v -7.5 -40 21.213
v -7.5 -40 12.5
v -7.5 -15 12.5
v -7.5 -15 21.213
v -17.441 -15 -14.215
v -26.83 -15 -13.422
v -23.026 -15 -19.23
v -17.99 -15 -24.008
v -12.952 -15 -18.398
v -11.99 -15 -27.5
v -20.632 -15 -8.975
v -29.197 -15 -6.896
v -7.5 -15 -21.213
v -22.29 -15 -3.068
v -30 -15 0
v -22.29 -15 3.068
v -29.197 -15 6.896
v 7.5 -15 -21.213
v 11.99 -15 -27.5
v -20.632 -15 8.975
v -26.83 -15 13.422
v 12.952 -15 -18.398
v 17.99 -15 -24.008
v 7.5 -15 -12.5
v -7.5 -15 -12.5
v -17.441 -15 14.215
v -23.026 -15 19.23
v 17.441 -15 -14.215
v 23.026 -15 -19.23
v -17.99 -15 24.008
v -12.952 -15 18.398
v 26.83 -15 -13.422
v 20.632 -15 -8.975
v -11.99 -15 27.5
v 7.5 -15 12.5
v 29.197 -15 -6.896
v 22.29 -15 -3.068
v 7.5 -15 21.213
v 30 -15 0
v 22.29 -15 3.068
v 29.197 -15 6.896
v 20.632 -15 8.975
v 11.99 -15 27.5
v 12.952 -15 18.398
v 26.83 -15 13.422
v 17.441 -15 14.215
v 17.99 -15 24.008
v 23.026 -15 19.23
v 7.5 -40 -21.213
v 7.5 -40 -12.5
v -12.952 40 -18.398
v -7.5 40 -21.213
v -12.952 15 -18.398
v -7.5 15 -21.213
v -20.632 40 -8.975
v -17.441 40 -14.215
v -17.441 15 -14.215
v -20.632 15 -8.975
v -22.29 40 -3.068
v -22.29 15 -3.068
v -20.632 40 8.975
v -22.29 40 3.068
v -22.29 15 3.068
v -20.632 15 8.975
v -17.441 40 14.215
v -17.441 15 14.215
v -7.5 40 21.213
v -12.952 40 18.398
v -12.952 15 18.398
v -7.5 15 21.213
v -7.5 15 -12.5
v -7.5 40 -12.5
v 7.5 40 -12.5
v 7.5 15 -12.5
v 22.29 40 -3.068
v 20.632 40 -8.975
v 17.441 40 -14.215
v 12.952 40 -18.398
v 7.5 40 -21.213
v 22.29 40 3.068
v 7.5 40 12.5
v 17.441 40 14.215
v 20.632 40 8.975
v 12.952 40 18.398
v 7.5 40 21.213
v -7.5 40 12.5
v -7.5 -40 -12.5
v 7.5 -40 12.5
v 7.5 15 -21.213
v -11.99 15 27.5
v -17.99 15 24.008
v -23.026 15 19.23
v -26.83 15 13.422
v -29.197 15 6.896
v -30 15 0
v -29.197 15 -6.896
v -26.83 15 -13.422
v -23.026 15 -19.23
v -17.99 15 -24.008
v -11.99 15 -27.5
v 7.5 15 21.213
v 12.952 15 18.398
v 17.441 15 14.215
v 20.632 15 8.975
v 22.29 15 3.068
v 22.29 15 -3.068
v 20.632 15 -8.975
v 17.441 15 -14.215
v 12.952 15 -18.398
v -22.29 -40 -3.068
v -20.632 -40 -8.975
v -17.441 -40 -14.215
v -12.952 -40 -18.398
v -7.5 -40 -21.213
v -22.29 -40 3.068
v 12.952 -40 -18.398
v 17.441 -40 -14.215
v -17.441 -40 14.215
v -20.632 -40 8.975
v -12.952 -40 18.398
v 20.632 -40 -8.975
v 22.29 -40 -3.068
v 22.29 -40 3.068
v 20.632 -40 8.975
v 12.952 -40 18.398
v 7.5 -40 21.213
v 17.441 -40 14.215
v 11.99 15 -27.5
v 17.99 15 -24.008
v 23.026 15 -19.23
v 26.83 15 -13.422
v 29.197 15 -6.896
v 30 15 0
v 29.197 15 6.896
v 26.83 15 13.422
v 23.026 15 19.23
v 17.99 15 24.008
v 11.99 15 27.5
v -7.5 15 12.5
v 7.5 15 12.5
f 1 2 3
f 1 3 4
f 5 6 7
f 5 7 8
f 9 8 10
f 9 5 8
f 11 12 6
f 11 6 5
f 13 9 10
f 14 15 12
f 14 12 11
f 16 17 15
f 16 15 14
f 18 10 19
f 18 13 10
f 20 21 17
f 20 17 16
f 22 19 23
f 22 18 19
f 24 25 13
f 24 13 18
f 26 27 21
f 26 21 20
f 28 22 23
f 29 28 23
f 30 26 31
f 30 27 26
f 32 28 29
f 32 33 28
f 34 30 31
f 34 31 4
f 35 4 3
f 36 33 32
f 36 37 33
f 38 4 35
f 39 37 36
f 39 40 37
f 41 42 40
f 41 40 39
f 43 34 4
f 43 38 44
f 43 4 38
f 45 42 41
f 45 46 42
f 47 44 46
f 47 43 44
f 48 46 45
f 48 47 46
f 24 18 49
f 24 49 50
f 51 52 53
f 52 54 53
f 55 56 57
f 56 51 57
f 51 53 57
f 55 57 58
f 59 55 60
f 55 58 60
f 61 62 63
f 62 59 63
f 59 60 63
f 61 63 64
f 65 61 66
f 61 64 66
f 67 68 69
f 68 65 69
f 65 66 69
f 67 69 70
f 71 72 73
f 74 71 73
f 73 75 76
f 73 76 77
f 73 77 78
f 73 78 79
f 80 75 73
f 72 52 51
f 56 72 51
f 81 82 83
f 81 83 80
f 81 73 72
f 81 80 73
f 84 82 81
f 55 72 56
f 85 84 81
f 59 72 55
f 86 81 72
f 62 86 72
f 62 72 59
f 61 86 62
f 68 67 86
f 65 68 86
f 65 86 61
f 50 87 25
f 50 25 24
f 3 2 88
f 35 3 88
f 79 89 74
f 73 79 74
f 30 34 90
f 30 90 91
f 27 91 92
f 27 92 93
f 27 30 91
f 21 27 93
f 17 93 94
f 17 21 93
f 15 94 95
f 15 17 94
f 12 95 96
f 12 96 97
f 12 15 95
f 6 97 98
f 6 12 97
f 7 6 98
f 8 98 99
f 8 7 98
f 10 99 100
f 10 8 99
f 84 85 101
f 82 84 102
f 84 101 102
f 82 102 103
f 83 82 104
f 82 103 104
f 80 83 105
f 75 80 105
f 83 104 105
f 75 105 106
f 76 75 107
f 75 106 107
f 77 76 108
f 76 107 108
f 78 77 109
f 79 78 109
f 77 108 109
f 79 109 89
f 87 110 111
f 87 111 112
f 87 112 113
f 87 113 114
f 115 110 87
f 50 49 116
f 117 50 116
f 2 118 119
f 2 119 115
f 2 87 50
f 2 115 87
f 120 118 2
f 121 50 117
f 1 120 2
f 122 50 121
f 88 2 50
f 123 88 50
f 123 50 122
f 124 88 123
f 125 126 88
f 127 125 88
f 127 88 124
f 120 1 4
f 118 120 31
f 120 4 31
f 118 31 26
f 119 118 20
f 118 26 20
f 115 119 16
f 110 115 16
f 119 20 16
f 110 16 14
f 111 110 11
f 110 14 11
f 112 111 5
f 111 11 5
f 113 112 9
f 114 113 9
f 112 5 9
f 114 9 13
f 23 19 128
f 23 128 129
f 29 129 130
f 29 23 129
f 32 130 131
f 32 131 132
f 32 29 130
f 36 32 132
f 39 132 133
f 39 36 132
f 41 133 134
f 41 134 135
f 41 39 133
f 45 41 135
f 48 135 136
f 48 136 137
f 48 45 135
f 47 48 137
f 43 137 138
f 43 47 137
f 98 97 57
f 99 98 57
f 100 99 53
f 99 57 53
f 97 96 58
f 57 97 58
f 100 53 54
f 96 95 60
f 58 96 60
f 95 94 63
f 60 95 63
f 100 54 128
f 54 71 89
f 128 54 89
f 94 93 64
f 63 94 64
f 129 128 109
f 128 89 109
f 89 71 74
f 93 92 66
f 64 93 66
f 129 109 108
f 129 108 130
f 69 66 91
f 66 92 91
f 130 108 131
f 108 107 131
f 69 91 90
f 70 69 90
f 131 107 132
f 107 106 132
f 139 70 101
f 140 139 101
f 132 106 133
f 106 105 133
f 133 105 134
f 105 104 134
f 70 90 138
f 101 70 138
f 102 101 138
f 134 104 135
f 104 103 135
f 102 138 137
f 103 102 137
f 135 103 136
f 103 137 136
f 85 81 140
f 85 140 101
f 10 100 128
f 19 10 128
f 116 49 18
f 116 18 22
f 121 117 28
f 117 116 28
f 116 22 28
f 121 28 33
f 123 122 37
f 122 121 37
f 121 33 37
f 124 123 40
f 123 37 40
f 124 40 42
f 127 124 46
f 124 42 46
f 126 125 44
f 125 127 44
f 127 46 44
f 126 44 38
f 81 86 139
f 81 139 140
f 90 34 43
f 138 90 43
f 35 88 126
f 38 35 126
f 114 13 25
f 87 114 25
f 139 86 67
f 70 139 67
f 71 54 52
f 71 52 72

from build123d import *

# Parameters (mm, degrees)
F0_R     = 30
F1_DEPTH = 15
F2_R     = 22.5
F3_DEPTH = 25
F4_R     = 22.5
F5_DEPTH = 25
F6_W     = 30
F6_H     = 8
F7_DEPTH = 15
F8_W     = 15
F8_H     = 12
F9_DEPTH = 25


# Not quite as in the source:
# - a pattern or mirror of a feature is missing from the dataset's text; its kind, count and spacing are read off the source's solid


with BuildPart() as f1:
    # F0 (on Front) → F1 (new body, symmetric)
    with BuildSketch(Plane.XZ):
        Circle(F0_R)
    extrude(amount=F1_DEPTH, both=True)

    # F2 (on face) → F3 (join)
    with BuildSketch(Plane.XZ.offset(15)):
        Circle(F2_R)
    extrude(amount=F3_DEPTH)

    # F4 (on face) → F5 (join)
    with BuildSketch(Plane(origin=(0, 15, 0), x_dir=(-1, 0, 0), z_dir=(0, 1, 0))):
        Circle(F4_R)
    extrude(amount=F5_DEPTH)

    # F6 (on Front) → F7 (cut, symmetric)
    with BuildSketch(Plane.XZ):
        with Locations((0, 31.5)):
            Rectangle(F6_W, F6_H)
        with Locations((0, -31.5)):
            Rectangle(F6_W, F6_H)
    extrude(amount=F7_DEPTH, both=True, mode=Mode.SUBTRACT)

    # F8 (on face) → F9 (cut)
    with BuildSketch(Plane.XZ.offset(40)):
        with Locations((0, 18.5)):
            Rectangle(F8_W, F8_H)
        with Locations((0, -18.5)):
            Rectangle(F8_W, F8_H)
    f9 = extrude(amount=-F9_DEPTH, mode=Mode.SUBTRACT)

    # F9_copies: F9 across plane
    add(f9.mirror(Plane.ZX), mode=Mode.SUBTRACT)


solid = f1.part
